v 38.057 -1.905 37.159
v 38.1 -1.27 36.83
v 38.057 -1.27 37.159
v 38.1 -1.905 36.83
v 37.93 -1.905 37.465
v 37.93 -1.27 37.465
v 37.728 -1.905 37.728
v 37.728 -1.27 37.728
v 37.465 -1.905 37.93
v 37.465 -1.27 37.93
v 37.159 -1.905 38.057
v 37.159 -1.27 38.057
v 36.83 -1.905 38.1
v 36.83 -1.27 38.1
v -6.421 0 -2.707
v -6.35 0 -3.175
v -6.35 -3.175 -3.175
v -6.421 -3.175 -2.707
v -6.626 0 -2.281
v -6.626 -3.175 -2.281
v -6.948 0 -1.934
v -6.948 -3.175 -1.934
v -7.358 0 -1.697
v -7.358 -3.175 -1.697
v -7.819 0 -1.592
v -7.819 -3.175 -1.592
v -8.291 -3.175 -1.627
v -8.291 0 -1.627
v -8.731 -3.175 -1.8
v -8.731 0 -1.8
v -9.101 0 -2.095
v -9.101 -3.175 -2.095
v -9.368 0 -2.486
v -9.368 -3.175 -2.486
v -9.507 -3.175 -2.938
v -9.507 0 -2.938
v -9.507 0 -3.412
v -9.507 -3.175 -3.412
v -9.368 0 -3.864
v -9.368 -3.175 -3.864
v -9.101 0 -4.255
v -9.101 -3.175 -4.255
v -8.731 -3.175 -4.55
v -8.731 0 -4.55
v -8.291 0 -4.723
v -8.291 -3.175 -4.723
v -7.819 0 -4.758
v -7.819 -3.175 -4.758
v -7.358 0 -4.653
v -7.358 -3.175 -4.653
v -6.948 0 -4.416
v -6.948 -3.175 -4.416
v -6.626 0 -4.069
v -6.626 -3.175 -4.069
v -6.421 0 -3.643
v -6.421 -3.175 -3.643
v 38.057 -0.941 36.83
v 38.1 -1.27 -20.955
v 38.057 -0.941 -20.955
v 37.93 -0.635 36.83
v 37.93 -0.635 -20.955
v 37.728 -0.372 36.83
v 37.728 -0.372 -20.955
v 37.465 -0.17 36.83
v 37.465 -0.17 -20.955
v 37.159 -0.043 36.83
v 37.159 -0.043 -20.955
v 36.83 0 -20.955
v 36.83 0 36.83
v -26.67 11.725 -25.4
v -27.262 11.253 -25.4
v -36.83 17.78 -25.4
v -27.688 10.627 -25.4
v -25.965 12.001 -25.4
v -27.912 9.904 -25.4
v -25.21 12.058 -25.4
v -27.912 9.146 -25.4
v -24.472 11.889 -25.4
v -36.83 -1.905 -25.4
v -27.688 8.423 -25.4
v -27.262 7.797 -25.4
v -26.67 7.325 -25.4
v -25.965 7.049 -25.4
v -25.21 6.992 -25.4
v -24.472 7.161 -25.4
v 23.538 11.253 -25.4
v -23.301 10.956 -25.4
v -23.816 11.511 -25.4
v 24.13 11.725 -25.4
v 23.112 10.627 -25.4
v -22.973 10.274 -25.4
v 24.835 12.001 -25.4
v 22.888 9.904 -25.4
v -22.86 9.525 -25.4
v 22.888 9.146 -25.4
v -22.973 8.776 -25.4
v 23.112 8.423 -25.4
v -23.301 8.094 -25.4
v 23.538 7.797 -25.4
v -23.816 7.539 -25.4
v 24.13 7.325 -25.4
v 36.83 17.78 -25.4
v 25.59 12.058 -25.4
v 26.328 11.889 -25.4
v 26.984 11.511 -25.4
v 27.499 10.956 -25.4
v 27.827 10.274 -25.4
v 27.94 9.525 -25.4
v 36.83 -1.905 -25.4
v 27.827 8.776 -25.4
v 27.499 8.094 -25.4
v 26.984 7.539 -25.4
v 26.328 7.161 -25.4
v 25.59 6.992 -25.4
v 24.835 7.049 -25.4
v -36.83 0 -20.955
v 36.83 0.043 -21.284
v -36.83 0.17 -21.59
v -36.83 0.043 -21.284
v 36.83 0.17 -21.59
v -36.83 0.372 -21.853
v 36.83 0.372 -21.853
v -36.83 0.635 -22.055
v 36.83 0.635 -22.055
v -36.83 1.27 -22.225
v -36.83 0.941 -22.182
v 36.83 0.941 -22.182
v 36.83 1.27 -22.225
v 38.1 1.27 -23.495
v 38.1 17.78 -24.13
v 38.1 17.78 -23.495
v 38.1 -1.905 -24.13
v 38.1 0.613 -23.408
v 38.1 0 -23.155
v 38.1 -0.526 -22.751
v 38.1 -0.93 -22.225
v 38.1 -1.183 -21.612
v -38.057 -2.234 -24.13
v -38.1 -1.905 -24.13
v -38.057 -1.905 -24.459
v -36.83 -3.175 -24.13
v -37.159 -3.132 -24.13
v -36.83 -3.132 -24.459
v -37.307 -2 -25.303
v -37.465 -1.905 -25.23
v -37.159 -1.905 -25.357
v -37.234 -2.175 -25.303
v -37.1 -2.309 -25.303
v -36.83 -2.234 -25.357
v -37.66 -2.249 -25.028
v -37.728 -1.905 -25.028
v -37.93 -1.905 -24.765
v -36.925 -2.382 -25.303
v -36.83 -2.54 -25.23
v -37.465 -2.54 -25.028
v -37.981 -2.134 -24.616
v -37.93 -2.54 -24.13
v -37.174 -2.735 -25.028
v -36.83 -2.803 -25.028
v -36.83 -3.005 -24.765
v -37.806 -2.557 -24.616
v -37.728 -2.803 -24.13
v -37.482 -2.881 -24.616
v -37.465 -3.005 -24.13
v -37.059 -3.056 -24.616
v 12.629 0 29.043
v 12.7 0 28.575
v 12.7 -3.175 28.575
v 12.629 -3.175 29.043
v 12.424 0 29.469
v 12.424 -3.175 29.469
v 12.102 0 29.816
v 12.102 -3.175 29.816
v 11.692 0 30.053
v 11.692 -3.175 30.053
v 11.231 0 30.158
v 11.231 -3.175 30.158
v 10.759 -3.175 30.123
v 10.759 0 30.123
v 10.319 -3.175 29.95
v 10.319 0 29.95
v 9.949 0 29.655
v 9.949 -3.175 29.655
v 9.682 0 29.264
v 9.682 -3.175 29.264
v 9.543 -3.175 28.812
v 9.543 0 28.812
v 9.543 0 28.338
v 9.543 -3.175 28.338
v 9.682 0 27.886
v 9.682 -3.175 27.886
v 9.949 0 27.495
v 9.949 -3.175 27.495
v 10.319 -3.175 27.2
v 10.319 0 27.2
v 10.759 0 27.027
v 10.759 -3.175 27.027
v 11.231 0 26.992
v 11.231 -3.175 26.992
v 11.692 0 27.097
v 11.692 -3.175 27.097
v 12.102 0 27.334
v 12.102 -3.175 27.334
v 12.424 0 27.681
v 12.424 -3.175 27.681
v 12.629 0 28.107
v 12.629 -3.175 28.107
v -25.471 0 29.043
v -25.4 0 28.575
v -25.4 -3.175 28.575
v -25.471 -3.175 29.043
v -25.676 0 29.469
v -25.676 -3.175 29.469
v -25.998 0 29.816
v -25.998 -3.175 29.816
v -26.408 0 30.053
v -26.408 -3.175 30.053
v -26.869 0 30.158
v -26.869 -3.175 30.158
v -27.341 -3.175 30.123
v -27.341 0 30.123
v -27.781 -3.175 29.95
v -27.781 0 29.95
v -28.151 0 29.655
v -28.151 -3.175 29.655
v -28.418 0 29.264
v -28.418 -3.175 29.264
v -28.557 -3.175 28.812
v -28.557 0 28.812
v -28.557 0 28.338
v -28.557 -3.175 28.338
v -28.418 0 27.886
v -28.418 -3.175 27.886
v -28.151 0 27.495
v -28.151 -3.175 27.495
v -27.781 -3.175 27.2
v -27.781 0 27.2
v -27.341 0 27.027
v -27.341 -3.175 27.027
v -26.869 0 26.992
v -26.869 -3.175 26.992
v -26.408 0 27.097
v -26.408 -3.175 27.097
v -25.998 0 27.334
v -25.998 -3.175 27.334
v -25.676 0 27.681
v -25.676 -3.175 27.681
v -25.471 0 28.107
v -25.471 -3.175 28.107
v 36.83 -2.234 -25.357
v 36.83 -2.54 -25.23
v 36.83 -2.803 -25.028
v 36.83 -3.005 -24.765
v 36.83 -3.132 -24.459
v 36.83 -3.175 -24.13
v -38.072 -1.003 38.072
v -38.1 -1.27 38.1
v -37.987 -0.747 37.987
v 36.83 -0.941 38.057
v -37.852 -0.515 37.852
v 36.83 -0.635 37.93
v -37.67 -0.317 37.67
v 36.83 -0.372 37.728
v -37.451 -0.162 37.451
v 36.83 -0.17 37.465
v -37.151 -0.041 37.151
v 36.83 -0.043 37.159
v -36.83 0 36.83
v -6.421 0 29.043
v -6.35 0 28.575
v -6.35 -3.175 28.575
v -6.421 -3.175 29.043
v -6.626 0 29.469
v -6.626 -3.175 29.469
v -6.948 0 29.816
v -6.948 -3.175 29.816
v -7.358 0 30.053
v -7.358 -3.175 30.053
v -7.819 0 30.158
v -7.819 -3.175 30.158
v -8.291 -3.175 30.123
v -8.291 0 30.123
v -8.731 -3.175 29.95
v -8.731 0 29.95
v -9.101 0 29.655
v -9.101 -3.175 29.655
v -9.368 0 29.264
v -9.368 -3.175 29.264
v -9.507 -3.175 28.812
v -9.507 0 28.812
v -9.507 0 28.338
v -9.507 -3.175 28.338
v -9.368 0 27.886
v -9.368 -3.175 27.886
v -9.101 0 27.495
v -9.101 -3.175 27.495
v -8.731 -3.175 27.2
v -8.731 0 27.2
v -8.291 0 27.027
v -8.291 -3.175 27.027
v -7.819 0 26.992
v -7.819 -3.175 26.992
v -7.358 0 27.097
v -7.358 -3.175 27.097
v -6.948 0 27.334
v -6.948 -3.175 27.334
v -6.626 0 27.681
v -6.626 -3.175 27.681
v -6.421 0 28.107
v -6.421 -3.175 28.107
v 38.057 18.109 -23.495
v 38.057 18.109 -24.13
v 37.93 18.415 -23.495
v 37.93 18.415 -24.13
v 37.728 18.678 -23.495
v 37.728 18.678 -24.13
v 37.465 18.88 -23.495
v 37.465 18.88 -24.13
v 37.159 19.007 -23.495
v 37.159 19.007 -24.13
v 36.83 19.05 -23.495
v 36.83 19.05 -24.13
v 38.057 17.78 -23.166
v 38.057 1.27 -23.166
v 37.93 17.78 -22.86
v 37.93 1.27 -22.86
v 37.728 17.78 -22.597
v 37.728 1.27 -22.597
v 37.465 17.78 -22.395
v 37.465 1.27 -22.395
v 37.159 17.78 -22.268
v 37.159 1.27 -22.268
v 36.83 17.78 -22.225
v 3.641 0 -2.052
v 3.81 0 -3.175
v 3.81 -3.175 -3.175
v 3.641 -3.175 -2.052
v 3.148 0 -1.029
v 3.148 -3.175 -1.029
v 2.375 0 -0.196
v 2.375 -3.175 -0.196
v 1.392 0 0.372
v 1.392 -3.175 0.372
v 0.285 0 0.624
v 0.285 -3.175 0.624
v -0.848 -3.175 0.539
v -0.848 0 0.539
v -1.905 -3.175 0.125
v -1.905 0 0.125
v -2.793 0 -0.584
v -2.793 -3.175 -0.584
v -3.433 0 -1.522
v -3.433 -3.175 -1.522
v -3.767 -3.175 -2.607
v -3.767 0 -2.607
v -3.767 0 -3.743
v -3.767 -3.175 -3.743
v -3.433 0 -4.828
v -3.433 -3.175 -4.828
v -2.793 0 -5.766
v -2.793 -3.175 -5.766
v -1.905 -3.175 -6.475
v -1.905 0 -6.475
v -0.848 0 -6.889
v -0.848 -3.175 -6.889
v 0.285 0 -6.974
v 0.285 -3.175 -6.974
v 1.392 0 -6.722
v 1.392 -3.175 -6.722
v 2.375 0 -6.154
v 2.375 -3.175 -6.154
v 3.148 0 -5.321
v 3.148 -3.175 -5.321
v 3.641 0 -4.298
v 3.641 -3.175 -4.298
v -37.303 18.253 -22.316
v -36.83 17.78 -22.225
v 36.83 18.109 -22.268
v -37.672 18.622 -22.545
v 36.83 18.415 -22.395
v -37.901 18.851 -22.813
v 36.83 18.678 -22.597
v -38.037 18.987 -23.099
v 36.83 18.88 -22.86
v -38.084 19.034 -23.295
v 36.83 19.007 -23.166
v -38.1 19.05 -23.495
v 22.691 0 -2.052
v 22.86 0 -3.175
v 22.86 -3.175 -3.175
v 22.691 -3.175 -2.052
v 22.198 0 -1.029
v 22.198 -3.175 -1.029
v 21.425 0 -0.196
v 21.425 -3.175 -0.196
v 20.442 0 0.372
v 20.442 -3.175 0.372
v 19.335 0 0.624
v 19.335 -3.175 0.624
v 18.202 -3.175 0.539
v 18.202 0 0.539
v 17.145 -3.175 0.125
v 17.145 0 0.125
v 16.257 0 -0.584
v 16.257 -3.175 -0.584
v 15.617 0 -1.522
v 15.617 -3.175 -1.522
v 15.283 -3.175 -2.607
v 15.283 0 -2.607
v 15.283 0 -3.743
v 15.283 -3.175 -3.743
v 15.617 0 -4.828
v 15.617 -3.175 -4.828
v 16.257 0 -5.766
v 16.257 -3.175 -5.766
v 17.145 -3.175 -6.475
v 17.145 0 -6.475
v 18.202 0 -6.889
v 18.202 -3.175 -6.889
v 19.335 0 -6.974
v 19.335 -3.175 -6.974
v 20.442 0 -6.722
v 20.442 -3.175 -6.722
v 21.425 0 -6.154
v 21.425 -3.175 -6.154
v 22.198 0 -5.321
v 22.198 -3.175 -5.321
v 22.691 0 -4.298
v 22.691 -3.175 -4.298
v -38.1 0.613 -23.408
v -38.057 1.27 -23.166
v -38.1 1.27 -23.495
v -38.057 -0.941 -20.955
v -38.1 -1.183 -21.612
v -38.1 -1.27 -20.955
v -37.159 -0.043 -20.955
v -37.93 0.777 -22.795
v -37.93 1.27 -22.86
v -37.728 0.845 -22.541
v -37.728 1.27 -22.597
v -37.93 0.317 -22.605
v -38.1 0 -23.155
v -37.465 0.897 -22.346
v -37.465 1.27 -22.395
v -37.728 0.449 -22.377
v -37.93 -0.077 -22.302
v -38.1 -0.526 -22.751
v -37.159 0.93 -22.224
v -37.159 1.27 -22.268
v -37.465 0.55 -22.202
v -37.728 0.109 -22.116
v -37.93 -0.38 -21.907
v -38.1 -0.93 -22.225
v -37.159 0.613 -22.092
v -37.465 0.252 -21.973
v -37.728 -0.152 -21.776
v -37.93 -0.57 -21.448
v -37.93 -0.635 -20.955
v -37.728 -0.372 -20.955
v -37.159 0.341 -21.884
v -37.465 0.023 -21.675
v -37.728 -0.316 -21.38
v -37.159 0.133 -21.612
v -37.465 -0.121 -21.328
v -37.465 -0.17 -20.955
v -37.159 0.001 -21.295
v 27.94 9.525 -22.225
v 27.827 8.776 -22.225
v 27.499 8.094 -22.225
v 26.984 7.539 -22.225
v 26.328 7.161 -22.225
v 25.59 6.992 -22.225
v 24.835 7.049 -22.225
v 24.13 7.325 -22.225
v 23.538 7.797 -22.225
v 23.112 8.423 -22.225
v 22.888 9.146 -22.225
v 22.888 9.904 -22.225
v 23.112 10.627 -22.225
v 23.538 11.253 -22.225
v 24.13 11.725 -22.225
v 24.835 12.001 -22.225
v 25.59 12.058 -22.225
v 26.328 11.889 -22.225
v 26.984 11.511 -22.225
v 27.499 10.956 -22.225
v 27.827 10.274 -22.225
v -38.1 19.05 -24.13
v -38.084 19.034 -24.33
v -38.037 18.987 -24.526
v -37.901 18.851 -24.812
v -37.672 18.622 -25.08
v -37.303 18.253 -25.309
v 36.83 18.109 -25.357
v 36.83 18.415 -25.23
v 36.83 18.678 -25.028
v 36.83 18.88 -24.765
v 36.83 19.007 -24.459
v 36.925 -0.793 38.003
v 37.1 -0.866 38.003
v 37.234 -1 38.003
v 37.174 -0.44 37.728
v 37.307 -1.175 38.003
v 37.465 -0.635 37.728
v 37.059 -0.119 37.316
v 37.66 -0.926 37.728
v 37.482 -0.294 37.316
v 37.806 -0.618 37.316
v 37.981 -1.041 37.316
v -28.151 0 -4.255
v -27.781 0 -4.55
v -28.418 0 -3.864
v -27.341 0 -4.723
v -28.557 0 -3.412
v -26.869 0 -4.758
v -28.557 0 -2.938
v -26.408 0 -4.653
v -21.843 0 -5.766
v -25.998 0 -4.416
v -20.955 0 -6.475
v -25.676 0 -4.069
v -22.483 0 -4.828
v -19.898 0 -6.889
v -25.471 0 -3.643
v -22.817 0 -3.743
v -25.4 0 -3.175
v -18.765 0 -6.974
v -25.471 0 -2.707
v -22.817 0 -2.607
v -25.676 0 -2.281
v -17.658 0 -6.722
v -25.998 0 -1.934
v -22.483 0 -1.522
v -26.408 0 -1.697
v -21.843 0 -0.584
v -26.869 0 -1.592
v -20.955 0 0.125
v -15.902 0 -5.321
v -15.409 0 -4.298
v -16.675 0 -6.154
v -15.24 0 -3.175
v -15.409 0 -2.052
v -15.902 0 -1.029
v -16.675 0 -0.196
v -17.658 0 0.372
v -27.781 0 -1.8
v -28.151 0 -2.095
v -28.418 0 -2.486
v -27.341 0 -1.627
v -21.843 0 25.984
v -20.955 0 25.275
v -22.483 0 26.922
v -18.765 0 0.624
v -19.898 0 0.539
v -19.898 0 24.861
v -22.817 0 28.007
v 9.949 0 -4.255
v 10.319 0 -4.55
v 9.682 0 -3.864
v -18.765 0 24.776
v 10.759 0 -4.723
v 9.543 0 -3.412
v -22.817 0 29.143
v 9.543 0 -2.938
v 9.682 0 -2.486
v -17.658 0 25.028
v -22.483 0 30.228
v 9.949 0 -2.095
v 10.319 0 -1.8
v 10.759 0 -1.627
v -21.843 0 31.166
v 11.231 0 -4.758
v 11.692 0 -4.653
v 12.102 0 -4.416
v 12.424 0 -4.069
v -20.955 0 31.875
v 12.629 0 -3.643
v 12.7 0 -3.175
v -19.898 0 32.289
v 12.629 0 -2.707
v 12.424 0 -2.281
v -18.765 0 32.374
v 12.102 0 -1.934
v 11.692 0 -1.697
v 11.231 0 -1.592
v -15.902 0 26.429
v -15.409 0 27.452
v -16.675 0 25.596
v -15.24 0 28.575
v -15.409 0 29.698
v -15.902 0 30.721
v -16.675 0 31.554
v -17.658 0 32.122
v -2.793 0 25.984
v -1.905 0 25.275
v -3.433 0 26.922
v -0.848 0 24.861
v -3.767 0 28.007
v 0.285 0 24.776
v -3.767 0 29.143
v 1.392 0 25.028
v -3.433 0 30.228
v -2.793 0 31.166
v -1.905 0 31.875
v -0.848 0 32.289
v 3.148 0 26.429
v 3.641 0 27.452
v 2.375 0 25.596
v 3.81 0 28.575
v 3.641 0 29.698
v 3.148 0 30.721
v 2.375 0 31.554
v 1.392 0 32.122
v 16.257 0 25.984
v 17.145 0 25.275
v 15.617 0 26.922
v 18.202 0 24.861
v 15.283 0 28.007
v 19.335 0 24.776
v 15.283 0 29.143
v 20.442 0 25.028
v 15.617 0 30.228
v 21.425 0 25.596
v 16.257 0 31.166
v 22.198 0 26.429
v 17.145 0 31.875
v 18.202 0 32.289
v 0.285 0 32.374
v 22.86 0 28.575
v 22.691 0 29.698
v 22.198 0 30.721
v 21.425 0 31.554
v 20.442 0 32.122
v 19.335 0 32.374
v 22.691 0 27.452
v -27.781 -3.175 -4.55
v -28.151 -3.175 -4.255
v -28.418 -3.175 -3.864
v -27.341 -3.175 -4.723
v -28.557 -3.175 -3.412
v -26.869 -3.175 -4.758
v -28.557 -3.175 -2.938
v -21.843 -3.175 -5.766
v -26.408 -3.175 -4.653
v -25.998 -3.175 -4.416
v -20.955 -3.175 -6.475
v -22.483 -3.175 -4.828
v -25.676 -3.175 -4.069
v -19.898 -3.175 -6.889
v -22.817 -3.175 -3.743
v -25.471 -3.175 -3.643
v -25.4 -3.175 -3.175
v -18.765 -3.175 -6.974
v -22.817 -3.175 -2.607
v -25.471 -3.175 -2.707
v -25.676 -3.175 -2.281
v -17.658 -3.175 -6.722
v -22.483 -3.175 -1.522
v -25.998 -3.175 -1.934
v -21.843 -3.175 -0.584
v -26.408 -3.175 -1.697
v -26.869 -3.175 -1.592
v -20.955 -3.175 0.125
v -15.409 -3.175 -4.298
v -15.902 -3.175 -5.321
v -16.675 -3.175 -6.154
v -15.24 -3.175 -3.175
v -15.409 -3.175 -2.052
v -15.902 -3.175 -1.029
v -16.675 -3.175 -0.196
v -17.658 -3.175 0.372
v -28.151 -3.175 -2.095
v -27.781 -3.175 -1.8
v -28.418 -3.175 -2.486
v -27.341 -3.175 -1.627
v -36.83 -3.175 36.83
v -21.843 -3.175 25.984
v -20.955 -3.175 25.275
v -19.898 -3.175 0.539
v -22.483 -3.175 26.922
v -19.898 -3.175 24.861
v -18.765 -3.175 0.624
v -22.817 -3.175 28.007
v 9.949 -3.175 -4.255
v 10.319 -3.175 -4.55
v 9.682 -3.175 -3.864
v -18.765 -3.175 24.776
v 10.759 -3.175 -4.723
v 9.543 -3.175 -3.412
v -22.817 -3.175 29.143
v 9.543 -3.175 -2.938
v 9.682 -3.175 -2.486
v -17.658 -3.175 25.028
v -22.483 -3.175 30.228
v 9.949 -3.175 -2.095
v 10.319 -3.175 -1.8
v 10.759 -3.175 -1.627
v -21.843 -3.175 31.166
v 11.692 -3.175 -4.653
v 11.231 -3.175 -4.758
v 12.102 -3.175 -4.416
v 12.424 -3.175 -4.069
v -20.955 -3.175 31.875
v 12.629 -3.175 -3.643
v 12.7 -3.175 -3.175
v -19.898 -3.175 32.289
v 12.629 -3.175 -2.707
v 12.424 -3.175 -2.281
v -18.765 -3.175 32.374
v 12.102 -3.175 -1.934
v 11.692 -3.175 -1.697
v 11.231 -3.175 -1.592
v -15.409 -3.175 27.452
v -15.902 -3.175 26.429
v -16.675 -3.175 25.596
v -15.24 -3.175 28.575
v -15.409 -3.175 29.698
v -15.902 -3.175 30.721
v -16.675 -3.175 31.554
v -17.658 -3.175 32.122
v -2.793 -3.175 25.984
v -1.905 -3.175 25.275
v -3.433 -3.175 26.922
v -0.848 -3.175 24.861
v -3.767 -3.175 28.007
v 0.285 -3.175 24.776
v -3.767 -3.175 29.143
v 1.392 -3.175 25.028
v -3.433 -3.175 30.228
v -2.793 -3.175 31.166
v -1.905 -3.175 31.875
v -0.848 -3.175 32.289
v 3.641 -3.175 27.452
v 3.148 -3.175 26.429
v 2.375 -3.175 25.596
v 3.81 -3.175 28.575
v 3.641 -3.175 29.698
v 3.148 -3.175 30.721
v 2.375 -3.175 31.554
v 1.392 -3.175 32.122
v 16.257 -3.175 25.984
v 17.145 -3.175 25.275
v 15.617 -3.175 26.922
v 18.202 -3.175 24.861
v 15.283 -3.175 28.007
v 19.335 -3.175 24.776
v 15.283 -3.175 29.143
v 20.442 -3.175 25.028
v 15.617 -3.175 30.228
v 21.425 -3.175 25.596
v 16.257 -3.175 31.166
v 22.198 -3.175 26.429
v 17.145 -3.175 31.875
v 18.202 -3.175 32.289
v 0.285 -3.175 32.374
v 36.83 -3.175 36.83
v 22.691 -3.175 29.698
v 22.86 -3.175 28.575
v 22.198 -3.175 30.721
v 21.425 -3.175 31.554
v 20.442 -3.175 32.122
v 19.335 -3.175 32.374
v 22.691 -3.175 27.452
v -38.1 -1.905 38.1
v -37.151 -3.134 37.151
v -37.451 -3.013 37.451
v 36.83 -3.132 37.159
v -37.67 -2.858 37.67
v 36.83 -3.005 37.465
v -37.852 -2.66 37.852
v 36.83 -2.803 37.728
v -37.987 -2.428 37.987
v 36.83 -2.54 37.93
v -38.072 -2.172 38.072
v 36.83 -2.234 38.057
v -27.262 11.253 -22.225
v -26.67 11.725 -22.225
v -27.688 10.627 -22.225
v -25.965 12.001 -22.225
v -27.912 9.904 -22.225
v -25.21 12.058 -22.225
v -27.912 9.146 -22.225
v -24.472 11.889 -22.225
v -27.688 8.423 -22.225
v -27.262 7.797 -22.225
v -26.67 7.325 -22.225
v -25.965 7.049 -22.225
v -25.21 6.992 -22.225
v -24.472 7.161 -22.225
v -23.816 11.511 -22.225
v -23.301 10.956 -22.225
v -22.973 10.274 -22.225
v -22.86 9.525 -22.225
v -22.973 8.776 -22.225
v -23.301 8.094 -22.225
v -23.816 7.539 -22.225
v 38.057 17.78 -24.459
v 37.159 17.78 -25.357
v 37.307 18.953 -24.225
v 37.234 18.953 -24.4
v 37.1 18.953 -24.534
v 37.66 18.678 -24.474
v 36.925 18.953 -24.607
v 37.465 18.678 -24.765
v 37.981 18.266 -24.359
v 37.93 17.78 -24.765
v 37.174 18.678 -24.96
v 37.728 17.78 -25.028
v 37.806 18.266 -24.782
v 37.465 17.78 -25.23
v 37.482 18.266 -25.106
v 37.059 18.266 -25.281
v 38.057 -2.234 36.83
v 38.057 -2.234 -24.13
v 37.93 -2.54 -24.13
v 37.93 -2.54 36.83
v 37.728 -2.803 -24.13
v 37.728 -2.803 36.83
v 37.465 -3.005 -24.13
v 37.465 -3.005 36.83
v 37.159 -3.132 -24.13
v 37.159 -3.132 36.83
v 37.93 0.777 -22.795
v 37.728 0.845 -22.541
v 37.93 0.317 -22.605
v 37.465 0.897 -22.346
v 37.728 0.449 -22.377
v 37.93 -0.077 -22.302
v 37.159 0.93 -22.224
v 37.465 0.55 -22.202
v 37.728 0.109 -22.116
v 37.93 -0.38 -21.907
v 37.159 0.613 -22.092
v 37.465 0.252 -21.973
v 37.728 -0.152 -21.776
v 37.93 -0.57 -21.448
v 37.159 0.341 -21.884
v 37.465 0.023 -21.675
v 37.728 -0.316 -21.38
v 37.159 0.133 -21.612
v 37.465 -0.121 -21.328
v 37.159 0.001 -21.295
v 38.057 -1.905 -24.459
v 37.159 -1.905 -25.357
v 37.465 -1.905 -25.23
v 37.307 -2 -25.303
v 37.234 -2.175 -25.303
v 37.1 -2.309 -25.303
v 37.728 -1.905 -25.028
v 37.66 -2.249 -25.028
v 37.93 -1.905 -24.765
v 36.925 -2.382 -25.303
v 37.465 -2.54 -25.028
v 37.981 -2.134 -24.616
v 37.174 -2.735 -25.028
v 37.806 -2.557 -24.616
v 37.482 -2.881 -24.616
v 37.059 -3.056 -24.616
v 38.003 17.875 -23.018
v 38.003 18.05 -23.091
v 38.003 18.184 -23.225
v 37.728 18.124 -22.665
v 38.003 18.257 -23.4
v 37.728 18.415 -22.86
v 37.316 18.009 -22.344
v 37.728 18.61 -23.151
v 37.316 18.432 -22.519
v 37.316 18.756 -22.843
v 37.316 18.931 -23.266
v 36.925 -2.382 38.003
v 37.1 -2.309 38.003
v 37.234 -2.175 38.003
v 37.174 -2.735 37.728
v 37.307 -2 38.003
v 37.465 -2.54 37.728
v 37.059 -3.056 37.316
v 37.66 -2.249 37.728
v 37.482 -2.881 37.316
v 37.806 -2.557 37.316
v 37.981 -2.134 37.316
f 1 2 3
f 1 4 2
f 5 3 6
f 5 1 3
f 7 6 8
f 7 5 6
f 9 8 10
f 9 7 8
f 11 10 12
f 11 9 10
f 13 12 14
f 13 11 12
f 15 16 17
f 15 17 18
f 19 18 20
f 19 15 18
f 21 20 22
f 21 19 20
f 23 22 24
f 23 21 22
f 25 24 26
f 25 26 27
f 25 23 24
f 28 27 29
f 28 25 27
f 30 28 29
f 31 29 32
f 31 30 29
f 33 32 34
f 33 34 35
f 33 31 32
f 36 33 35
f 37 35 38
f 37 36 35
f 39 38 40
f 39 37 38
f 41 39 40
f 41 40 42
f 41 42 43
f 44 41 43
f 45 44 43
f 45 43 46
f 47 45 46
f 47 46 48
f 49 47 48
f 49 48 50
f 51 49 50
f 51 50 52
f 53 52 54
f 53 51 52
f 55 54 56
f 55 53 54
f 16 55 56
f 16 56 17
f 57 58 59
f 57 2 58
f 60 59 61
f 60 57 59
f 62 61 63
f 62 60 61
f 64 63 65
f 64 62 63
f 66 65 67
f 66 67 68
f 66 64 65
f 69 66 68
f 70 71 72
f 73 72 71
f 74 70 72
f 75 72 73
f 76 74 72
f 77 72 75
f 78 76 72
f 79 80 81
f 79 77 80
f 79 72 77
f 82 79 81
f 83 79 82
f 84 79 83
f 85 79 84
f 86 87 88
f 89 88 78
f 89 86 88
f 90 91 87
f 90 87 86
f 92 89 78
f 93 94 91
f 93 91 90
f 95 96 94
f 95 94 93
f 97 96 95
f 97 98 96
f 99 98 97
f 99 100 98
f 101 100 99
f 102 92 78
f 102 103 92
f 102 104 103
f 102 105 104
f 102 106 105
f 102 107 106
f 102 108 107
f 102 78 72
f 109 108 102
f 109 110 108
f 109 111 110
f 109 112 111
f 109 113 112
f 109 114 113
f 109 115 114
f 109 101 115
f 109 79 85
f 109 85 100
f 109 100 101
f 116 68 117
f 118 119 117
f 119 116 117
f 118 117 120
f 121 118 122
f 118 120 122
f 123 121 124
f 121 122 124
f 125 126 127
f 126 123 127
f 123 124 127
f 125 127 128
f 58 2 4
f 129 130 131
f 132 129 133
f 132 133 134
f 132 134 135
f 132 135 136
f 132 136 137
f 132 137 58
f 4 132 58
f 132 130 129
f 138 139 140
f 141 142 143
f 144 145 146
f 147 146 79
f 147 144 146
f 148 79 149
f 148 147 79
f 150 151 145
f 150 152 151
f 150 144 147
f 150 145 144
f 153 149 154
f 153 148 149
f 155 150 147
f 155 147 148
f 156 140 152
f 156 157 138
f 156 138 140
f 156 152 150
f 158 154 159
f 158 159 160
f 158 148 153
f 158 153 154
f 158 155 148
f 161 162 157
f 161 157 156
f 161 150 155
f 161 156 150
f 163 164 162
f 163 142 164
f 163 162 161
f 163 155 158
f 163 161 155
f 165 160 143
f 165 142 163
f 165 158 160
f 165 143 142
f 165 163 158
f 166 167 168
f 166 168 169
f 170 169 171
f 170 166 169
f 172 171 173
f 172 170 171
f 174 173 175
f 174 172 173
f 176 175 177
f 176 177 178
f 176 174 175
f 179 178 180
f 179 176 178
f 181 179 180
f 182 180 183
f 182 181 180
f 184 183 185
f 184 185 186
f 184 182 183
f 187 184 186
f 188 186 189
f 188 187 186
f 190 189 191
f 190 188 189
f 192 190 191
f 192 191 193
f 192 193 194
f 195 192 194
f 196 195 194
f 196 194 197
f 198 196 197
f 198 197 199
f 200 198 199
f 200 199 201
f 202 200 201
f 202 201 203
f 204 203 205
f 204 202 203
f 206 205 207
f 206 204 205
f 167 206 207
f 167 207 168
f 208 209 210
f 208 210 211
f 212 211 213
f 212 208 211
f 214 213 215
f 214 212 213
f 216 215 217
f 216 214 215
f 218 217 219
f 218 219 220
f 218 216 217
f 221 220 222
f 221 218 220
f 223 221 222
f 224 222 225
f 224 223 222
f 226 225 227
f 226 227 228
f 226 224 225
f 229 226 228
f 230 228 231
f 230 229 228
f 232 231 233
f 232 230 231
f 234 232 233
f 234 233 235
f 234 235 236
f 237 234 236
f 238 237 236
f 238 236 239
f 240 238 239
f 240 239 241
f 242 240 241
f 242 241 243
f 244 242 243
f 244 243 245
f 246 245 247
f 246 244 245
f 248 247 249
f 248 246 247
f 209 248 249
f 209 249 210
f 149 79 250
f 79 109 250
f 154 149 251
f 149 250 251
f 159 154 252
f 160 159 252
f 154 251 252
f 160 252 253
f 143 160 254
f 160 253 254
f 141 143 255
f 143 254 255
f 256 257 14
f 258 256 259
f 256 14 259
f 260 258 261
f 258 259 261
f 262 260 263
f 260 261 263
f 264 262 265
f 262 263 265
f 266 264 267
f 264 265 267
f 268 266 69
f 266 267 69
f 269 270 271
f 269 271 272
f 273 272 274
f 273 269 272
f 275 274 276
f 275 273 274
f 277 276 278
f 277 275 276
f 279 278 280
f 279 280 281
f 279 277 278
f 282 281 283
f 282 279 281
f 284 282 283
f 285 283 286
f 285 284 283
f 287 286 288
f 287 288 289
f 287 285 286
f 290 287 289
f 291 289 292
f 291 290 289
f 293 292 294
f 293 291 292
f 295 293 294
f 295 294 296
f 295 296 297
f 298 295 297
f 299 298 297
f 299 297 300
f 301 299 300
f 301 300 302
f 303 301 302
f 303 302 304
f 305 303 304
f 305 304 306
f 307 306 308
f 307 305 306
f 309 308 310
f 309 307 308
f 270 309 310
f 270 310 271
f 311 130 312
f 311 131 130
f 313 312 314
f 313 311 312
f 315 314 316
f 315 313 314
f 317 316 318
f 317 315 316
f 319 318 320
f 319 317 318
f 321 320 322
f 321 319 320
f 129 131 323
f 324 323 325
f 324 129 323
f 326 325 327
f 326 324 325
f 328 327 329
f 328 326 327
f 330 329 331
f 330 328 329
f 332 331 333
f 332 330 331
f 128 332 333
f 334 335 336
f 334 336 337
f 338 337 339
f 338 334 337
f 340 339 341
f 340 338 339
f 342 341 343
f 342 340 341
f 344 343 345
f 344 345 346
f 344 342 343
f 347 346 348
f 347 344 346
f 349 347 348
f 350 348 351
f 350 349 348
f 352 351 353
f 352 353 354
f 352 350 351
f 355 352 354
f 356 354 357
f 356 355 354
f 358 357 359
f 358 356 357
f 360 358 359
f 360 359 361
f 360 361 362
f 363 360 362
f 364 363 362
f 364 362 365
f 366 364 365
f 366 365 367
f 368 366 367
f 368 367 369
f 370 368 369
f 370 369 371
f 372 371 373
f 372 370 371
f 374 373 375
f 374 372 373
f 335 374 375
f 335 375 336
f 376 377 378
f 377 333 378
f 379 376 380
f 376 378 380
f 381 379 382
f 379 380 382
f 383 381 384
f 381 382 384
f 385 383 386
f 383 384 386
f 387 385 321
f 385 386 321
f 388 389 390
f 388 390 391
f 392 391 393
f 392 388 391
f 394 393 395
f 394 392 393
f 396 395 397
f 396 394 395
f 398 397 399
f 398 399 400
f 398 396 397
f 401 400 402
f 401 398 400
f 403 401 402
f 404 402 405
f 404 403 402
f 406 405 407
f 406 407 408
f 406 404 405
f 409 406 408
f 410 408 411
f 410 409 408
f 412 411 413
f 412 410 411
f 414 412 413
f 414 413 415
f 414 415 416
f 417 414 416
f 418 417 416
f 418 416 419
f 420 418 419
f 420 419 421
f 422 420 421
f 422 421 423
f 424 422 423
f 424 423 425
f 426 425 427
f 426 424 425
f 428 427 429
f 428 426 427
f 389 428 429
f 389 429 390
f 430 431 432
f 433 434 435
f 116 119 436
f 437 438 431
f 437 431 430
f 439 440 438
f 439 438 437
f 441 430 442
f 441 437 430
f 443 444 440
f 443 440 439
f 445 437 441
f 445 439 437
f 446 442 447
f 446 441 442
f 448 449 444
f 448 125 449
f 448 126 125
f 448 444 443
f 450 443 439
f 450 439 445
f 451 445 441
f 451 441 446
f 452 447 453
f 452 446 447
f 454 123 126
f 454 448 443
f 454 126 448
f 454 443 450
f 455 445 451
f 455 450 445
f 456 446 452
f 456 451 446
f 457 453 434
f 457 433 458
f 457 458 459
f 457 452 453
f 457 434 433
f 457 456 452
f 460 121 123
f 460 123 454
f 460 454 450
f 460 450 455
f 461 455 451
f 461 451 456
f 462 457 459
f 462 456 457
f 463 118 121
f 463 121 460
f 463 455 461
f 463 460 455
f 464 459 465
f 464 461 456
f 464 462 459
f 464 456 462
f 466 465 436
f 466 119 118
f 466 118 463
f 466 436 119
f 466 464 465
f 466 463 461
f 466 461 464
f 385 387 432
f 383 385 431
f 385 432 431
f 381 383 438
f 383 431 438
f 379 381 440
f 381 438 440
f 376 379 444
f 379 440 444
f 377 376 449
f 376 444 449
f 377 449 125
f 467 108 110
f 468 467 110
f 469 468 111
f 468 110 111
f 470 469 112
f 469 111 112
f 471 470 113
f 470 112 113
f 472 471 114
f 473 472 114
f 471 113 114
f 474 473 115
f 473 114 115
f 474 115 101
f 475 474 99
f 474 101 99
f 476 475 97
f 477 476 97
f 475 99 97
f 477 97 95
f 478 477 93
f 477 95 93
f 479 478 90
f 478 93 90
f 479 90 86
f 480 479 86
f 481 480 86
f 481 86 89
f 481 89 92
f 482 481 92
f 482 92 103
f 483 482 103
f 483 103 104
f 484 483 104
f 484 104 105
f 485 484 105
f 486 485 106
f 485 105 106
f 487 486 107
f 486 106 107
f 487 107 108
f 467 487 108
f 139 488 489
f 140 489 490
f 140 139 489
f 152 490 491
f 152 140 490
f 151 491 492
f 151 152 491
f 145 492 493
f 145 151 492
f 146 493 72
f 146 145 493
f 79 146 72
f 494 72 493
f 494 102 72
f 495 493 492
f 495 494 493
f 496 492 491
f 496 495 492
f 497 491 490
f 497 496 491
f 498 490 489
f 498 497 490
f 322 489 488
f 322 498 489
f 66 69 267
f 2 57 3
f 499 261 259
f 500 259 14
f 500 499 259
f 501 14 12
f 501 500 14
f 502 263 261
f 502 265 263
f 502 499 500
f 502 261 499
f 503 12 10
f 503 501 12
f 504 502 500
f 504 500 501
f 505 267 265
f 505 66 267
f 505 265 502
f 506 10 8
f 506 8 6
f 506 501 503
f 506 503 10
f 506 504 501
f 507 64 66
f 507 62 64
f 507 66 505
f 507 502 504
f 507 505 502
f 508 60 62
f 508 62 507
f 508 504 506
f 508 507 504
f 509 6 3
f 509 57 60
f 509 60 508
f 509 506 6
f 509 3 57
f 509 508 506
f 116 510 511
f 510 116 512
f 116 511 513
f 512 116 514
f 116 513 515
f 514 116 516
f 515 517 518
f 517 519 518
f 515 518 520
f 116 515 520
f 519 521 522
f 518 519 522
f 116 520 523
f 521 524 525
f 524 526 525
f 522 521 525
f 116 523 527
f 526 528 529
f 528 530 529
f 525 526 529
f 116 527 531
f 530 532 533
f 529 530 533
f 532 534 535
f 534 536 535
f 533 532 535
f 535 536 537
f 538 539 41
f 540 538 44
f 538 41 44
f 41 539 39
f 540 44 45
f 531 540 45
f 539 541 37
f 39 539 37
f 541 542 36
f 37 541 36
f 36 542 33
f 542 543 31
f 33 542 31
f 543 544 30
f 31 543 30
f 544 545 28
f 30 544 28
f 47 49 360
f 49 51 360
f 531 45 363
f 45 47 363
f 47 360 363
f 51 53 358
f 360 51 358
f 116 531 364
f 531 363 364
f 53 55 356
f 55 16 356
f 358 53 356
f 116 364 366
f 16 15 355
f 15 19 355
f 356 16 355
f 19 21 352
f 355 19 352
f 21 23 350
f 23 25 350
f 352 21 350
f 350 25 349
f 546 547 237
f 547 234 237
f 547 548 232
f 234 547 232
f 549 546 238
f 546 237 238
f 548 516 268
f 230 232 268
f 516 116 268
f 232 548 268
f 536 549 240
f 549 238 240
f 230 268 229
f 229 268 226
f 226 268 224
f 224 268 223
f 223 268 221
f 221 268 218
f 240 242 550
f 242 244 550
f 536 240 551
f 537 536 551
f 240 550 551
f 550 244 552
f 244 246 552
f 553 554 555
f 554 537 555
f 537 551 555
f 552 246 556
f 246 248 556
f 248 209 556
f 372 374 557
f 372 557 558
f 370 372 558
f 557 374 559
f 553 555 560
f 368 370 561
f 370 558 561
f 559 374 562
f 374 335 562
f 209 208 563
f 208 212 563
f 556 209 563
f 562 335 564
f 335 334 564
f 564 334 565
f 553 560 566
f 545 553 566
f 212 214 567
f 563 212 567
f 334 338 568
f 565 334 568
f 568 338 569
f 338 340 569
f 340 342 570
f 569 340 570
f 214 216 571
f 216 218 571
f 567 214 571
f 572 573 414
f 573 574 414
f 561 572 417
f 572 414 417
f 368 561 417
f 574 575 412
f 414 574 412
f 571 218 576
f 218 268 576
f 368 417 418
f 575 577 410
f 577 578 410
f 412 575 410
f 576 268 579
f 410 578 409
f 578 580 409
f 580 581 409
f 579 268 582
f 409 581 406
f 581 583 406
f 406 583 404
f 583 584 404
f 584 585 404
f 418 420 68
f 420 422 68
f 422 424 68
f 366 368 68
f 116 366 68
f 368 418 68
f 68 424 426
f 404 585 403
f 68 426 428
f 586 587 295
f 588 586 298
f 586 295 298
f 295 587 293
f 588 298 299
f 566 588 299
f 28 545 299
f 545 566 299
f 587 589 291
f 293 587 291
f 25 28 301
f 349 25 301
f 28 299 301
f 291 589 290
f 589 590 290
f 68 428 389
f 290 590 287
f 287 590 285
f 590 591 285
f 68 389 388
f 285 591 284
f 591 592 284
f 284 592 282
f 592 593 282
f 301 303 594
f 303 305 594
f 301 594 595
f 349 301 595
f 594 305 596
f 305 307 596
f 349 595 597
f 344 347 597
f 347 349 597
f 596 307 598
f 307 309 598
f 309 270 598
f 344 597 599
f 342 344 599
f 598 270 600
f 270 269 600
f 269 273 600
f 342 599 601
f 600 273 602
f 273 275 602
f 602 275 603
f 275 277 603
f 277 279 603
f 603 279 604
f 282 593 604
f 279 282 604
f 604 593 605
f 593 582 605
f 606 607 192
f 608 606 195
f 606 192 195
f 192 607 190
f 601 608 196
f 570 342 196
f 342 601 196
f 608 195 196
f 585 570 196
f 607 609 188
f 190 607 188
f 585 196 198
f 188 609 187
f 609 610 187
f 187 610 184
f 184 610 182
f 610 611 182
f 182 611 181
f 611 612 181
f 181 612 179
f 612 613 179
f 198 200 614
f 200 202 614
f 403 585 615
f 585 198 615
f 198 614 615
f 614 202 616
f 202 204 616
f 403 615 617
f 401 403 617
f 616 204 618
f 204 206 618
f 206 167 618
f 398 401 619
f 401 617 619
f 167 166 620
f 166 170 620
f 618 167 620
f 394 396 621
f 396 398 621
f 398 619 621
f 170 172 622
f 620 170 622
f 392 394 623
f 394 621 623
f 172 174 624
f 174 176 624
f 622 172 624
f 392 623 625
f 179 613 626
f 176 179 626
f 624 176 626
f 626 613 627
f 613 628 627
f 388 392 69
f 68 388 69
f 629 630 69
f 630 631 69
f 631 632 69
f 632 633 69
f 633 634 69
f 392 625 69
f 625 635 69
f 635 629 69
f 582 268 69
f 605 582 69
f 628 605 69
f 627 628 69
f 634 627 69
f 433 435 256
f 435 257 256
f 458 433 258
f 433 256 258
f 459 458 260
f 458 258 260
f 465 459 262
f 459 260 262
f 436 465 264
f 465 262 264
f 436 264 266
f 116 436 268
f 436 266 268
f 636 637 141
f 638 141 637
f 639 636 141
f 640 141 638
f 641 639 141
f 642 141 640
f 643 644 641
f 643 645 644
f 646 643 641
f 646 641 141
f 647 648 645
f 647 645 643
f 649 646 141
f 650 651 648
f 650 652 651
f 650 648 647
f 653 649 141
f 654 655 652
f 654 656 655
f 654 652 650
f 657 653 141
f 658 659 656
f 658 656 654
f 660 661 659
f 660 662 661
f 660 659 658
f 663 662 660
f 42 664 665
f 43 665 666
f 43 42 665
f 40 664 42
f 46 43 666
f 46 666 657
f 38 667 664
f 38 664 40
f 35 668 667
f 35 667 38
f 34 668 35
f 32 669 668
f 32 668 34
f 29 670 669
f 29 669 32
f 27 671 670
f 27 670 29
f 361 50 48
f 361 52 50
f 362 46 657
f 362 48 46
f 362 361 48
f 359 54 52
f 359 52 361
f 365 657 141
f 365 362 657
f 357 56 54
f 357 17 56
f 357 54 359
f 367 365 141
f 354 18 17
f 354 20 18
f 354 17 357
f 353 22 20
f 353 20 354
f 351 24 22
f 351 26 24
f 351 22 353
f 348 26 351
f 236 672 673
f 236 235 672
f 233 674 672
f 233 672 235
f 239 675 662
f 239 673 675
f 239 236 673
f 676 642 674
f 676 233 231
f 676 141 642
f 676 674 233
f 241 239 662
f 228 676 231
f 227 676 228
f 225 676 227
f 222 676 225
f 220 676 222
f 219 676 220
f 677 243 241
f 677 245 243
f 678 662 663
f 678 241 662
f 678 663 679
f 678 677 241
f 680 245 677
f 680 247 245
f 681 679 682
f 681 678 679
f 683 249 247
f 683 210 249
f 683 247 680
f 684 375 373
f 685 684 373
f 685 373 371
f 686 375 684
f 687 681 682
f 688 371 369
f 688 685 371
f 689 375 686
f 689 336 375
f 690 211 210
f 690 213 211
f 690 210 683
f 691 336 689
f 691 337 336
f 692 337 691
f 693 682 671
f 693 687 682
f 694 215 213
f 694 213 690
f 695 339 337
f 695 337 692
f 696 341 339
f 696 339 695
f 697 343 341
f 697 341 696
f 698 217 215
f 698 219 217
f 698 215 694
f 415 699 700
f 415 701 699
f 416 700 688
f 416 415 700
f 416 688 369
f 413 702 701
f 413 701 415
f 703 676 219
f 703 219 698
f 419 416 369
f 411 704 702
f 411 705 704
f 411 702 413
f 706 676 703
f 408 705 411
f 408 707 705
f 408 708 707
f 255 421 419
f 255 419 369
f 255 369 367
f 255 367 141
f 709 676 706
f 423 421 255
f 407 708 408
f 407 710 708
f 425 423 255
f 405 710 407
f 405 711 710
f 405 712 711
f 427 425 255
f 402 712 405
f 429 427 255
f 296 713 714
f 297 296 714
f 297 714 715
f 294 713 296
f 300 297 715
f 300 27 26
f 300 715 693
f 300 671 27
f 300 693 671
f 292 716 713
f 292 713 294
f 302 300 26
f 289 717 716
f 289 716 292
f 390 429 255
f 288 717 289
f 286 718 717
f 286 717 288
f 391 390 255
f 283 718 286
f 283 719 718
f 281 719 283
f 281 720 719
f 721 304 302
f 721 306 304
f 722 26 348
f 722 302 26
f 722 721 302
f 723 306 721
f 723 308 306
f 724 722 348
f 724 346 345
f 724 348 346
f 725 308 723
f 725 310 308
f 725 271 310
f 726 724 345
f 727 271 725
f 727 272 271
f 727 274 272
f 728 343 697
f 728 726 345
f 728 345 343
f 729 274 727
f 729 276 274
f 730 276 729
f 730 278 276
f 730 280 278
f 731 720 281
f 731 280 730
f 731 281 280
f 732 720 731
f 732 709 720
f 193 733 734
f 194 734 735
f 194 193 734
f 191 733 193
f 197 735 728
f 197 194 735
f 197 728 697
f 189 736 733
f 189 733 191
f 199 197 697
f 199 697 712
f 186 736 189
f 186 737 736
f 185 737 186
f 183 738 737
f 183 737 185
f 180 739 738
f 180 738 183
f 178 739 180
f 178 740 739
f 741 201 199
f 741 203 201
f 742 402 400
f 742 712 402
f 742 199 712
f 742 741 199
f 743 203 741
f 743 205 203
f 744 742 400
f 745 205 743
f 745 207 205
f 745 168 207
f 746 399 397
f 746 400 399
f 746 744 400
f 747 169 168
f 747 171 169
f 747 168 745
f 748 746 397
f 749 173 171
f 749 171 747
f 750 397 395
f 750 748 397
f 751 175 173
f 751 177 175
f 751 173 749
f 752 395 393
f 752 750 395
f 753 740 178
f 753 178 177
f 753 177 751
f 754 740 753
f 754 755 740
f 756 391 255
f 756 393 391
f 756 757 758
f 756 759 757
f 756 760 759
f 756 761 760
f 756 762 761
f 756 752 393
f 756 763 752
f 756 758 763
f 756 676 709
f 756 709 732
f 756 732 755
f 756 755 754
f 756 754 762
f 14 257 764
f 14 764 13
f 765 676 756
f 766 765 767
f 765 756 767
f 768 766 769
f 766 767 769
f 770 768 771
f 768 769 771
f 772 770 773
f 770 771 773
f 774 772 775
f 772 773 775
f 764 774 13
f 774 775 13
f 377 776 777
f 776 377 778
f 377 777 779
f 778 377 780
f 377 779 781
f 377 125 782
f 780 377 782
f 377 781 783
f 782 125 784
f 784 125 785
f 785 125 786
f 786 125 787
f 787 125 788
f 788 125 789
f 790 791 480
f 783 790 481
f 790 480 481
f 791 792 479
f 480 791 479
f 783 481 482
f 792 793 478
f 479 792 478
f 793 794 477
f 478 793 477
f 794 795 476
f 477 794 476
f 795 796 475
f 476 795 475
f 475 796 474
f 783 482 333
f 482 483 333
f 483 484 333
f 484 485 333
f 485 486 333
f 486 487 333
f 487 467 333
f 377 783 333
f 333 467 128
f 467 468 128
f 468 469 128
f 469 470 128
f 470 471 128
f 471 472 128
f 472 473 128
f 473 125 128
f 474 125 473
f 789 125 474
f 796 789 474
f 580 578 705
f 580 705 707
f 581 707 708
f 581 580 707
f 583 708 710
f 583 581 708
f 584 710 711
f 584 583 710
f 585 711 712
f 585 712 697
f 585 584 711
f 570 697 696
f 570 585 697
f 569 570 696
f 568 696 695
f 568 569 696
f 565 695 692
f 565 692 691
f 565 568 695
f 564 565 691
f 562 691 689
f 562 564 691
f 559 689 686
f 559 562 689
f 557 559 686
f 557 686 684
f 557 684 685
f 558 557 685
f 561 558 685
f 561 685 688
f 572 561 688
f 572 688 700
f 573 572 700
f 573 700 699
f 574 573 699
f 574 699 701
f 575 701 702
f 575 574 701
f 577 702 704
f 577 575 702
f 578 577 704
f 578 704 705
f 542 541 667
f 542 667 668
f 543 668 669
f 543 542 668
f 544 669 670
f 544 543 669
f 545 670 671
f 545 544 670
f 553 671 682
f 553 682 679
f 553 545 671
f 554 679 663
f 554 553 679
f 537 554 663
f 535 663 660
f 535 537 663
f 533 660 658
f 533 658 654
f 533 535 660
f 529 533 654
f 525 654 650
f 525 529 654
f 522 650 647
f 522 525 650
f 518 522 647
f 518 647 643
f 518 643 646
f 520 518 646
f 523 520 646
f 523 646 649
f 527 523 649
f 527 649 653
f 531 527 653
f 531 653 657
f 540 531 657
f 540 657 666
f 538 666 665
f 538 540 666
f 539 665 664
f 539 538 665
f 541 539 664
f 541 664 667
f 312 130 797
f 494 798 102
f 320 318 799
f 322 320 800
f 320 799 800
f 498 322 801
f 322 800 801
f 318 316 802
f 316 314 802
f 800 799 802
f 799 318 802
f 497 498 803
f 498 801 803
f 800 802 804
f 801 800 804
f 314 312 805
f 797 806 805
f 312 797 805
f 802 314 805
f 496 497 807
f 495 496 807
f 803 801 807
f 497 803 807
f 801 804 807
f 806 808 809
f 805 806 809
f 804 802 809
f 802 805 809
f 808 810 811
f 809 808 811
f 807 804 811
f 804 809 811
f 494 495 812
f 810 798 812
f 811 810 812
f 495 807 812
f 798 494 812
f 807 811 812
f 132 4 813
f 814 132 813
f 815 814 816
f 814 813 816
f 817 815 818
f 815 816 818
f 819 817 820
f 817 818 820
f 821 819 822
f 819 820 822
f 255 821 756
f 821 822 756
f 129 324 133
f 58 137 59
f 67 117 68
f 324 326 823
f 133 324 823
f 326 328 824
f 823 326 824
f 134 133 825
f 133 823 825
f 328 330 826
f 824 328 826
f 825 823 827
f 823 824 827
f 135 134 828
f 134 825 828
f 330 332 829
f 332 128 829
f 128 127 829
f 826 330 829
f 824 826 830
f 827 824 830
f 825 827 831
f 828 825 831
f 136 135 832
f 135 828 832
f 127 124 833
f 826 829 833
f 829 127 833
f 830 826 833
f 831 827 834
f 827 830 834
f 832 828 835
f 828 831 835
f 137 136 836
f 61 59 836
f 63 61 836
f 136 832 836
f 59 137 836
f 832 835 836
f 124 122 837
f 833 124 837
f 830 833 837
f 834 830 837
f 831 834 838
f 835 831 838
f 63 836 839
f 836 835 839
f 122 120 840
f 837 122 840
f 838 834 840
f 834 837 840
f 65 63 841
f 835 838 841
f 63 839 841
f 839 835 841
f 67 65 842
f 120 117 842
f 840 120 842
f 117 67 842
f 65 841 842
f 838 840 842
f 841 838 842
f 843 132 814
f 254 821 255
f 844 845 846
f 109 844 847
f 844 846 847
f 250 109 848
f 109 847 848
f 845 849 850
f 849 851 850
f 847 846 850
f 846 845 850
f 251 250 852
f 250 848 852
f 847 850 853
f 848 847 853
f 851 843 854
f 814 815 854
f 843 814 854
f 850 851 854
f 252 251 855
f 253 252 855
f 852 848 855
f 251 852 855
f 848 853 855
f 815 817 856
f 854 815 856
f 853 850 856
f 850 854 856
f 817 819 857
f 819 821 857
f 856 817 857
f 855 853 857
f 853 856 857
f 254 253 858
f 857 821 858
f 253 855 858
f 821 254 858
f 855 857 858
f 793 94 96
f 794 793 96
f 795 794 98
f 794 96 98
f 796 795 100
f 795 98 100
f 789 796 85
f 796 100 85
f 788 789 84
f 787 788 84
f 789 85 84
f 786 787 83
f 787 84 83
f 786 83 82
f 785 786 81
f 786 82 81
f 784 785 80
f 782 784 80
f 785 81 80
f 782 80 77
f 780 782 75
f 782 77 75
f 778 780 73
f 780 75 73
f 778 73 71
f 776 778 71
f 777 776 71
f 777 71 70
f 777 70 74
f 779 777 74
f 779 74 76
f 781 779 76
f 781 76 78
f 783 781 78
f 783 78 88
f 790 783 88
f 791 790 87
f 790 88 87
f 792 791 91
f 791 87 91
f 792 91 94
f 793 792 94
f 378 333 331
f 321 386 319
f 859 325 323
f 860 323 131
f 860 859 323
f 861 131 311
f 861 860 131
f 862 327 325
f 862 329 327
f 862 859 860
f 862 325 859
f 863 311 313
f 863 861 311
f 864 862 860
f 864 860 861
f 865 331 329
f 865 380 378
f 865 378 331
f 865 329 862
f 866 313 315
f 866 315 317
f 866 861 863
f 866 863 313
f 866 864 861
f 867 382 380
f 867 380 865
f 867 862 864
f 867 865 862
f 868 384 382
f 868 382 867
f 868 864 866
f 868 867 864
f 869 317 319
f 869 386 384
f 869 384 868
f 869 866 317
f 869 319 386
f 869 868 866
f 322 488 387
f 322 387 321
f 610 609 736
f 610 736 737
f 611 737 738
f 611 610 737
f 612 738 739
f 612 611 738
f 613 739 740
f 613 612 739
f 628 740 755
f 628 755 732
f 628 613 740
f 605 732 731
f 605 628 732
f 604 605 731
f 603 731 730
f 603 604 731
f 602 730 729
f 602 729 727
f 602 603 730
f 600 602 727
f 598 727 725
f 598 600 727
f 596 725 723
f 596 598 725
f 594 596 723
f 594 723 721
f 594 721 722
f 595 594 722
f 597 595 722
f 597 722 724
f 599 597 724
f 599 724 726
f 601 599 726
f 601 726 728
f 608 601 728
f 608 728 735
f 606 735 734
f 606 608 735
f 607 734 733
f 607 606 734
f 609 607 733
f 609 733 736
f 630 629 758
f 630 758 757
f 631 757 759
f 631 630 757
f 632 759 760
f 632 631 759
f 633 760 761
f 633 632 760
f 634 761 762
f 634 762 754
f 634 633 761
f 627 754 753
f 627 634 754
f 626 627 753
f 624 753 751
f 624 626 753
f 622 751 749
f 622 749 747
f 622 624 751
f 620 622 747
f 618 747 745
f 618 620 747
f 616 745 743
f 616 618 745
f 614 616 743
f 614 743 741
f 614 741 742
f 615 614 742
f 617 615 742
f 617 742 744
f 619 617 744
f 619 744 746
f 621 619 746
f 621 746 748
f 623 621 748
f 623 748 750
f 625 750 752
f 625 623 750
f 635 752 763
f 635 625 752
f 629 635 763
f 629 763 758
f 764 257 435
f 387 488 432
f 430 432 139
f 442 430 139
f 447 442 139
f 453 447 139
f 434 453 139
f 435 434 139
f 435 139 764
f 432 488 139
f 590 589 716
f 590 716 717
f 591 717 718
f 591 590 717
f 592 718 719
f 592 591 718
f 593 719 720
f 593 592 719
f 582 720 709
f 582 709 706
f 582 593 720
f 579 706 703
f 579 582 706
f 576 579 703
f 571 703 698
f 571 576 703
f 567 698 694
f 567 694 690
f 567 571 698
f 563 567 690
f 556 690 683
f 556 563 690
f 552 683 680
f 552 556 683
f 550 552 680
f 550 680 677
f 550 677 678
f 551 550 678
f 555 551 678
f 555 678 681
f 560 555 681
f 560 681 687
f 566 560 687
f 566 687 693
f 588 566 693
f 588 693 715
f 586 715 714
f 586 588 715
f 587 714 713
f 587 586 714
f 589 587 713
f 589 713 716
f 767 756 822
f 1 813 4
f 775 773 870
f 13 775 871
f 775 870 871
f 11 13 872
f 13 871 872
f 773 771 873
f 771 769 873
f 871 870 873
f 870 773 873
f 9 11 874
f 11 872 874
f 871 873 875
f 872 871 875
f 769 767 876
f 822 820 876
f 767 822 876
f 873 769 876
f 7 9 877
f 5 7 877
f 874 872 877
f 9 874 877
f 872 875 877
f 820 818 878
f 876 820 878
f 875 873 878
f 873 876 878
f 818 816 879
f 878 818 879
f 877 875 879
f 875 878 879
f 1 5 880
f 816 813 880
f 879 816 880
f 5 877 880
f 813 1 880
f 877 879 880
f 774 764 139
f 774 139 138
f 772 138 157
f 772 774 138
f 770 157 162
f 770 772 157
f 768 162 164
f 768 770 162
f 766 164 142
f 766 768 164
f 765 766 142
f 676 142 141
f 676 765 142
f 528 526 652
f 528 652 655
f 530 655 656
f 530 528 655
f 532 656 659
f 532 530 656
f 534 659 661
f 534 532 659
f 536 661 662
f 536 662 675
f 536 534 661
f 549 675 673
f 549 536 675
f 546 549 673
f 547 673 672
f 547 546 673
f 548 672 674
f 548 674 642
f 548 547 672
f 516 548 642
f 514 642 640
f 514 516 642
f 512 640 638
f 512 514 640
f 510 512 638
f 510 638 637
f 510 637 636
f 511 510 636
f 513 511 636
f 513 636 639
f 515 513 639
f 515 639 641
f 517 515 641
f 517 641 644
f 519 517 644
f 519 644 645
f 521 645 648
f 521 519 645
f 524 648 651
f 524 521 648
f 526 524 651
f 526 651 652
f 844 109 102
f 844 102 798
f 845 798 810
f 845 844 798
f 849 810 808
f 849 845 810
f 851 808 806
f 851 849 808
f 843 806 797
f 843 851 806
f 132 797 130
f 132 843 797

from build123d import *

# Parameters (mm, degrees)
F0_W     = 76.2
F0_H     = 63.5
F0_R     = 1.5875
F0_R_2   = 3.81
F1_DEPTH = 3.175
F3_W     = 76.2
F3_H     = 19.05
F3_R     = 2.54
F4_DEPTH = 3.175
F5_R     = 1.27


with BuildPart() as f1:
    # F0 (on Front) → F1 (new body)
    with BuildSketch(Plane.XZ):
        with Locations((0, 6.35)):
            Rectangle(F0_W, F0_H)
        with Locations((-26.9875, -3.175)):
            Circle(F0_R, mode=Mode.SUBTRACT)
        with Locations((-19.05, -3.175)):
            Circle(F0_R_2, mode=Mode.SUBTRACT)
        with Locations((-7.9375, -3.175)):
            Circle(F0_R, mode=Mode.SUBTRACT)
        with Locations((0, -3.175)):
            Circle(F0_R_2, mode=Mode.SUBTRACT)
        with Locations((11.1125, -3.175)):
            Circle(F0_R, mode=Mode.SUBTRACT)
        with Locations((19.05, -3.175)):
            Circle(F0_R_2, mode=Mode.SUBTRACT)
        with Locations((-26.9875, 28.575)):
            Circle(F0_R, mode=Mode.SUBTRACT)
        with Locations((-19.05, 28.575)):
            Circle(F0_R_2, mode=Mode.SUBTRACT)
        with Locations((-7.9375, 28.575)):
            Circle(F0_R, mode=Mode.SUBTRACT)
        with Locations((0, 28.575)):
            Circle(F0_R_2, mode=Mode.SUBTRACT)
        with Locations((11.1125, 28.575)):
            Circle(F0_R, mode=Mode.SUBTRACT)
        with Locations((19.05, 28.575)):
            Circle(F0_R_2, mode=Mode.SUBTRACT)
    extrude(amount=F1_DEPTH)

    # F3 (on face) → F4 (join)
    with BuildSketch(Plane(origin=(0, 0, -25.4), x_dir=(1, 0, 0), z_dir=(0, 0, -1))):
        with Locations((0, -9.525)):
            Rectangle(F3_W, F3_H)
        with Locations((-25.4, -9.525)):
            Circle(F3_R, mode=Mode.SUBTRACT)
        with Locations((25.4, -9.525)):
            Circle(F3_R, mode=Mode.SUBTRACT)
    extrude(amount=-F4_DEPTH)

    # F5
    f5_edges = [f1.edges().sort_by_distance(p)[0] for p in [
        (38.1, -3.175, 6.35),
        (38.1, 0, 7.9375),
        (-38.1, -3.175, 6.35),
        (-38.1, 0, 7.9375),
        (0, 0, 38.1),
        (0, -3.175, 38.1),
        (0, 0, -22.225),
        (0, 19.05, -22.225),
        (38.1, 7.9375, -25.4),
        (38.1, -1.5875, 38.1),
        (38.1, 9.525, -22.225),
        (38.1, 19.05, -23.8125),
        (0, 19.05, -25.4),
        (-38.1, 7.9375, -25.4),
        (0, -3.175, -25.4),
        (-38.1, 9.525, -22.225),
    ]]
    fillet(f5_edges, radius=F5_R)


solid = f1.part
